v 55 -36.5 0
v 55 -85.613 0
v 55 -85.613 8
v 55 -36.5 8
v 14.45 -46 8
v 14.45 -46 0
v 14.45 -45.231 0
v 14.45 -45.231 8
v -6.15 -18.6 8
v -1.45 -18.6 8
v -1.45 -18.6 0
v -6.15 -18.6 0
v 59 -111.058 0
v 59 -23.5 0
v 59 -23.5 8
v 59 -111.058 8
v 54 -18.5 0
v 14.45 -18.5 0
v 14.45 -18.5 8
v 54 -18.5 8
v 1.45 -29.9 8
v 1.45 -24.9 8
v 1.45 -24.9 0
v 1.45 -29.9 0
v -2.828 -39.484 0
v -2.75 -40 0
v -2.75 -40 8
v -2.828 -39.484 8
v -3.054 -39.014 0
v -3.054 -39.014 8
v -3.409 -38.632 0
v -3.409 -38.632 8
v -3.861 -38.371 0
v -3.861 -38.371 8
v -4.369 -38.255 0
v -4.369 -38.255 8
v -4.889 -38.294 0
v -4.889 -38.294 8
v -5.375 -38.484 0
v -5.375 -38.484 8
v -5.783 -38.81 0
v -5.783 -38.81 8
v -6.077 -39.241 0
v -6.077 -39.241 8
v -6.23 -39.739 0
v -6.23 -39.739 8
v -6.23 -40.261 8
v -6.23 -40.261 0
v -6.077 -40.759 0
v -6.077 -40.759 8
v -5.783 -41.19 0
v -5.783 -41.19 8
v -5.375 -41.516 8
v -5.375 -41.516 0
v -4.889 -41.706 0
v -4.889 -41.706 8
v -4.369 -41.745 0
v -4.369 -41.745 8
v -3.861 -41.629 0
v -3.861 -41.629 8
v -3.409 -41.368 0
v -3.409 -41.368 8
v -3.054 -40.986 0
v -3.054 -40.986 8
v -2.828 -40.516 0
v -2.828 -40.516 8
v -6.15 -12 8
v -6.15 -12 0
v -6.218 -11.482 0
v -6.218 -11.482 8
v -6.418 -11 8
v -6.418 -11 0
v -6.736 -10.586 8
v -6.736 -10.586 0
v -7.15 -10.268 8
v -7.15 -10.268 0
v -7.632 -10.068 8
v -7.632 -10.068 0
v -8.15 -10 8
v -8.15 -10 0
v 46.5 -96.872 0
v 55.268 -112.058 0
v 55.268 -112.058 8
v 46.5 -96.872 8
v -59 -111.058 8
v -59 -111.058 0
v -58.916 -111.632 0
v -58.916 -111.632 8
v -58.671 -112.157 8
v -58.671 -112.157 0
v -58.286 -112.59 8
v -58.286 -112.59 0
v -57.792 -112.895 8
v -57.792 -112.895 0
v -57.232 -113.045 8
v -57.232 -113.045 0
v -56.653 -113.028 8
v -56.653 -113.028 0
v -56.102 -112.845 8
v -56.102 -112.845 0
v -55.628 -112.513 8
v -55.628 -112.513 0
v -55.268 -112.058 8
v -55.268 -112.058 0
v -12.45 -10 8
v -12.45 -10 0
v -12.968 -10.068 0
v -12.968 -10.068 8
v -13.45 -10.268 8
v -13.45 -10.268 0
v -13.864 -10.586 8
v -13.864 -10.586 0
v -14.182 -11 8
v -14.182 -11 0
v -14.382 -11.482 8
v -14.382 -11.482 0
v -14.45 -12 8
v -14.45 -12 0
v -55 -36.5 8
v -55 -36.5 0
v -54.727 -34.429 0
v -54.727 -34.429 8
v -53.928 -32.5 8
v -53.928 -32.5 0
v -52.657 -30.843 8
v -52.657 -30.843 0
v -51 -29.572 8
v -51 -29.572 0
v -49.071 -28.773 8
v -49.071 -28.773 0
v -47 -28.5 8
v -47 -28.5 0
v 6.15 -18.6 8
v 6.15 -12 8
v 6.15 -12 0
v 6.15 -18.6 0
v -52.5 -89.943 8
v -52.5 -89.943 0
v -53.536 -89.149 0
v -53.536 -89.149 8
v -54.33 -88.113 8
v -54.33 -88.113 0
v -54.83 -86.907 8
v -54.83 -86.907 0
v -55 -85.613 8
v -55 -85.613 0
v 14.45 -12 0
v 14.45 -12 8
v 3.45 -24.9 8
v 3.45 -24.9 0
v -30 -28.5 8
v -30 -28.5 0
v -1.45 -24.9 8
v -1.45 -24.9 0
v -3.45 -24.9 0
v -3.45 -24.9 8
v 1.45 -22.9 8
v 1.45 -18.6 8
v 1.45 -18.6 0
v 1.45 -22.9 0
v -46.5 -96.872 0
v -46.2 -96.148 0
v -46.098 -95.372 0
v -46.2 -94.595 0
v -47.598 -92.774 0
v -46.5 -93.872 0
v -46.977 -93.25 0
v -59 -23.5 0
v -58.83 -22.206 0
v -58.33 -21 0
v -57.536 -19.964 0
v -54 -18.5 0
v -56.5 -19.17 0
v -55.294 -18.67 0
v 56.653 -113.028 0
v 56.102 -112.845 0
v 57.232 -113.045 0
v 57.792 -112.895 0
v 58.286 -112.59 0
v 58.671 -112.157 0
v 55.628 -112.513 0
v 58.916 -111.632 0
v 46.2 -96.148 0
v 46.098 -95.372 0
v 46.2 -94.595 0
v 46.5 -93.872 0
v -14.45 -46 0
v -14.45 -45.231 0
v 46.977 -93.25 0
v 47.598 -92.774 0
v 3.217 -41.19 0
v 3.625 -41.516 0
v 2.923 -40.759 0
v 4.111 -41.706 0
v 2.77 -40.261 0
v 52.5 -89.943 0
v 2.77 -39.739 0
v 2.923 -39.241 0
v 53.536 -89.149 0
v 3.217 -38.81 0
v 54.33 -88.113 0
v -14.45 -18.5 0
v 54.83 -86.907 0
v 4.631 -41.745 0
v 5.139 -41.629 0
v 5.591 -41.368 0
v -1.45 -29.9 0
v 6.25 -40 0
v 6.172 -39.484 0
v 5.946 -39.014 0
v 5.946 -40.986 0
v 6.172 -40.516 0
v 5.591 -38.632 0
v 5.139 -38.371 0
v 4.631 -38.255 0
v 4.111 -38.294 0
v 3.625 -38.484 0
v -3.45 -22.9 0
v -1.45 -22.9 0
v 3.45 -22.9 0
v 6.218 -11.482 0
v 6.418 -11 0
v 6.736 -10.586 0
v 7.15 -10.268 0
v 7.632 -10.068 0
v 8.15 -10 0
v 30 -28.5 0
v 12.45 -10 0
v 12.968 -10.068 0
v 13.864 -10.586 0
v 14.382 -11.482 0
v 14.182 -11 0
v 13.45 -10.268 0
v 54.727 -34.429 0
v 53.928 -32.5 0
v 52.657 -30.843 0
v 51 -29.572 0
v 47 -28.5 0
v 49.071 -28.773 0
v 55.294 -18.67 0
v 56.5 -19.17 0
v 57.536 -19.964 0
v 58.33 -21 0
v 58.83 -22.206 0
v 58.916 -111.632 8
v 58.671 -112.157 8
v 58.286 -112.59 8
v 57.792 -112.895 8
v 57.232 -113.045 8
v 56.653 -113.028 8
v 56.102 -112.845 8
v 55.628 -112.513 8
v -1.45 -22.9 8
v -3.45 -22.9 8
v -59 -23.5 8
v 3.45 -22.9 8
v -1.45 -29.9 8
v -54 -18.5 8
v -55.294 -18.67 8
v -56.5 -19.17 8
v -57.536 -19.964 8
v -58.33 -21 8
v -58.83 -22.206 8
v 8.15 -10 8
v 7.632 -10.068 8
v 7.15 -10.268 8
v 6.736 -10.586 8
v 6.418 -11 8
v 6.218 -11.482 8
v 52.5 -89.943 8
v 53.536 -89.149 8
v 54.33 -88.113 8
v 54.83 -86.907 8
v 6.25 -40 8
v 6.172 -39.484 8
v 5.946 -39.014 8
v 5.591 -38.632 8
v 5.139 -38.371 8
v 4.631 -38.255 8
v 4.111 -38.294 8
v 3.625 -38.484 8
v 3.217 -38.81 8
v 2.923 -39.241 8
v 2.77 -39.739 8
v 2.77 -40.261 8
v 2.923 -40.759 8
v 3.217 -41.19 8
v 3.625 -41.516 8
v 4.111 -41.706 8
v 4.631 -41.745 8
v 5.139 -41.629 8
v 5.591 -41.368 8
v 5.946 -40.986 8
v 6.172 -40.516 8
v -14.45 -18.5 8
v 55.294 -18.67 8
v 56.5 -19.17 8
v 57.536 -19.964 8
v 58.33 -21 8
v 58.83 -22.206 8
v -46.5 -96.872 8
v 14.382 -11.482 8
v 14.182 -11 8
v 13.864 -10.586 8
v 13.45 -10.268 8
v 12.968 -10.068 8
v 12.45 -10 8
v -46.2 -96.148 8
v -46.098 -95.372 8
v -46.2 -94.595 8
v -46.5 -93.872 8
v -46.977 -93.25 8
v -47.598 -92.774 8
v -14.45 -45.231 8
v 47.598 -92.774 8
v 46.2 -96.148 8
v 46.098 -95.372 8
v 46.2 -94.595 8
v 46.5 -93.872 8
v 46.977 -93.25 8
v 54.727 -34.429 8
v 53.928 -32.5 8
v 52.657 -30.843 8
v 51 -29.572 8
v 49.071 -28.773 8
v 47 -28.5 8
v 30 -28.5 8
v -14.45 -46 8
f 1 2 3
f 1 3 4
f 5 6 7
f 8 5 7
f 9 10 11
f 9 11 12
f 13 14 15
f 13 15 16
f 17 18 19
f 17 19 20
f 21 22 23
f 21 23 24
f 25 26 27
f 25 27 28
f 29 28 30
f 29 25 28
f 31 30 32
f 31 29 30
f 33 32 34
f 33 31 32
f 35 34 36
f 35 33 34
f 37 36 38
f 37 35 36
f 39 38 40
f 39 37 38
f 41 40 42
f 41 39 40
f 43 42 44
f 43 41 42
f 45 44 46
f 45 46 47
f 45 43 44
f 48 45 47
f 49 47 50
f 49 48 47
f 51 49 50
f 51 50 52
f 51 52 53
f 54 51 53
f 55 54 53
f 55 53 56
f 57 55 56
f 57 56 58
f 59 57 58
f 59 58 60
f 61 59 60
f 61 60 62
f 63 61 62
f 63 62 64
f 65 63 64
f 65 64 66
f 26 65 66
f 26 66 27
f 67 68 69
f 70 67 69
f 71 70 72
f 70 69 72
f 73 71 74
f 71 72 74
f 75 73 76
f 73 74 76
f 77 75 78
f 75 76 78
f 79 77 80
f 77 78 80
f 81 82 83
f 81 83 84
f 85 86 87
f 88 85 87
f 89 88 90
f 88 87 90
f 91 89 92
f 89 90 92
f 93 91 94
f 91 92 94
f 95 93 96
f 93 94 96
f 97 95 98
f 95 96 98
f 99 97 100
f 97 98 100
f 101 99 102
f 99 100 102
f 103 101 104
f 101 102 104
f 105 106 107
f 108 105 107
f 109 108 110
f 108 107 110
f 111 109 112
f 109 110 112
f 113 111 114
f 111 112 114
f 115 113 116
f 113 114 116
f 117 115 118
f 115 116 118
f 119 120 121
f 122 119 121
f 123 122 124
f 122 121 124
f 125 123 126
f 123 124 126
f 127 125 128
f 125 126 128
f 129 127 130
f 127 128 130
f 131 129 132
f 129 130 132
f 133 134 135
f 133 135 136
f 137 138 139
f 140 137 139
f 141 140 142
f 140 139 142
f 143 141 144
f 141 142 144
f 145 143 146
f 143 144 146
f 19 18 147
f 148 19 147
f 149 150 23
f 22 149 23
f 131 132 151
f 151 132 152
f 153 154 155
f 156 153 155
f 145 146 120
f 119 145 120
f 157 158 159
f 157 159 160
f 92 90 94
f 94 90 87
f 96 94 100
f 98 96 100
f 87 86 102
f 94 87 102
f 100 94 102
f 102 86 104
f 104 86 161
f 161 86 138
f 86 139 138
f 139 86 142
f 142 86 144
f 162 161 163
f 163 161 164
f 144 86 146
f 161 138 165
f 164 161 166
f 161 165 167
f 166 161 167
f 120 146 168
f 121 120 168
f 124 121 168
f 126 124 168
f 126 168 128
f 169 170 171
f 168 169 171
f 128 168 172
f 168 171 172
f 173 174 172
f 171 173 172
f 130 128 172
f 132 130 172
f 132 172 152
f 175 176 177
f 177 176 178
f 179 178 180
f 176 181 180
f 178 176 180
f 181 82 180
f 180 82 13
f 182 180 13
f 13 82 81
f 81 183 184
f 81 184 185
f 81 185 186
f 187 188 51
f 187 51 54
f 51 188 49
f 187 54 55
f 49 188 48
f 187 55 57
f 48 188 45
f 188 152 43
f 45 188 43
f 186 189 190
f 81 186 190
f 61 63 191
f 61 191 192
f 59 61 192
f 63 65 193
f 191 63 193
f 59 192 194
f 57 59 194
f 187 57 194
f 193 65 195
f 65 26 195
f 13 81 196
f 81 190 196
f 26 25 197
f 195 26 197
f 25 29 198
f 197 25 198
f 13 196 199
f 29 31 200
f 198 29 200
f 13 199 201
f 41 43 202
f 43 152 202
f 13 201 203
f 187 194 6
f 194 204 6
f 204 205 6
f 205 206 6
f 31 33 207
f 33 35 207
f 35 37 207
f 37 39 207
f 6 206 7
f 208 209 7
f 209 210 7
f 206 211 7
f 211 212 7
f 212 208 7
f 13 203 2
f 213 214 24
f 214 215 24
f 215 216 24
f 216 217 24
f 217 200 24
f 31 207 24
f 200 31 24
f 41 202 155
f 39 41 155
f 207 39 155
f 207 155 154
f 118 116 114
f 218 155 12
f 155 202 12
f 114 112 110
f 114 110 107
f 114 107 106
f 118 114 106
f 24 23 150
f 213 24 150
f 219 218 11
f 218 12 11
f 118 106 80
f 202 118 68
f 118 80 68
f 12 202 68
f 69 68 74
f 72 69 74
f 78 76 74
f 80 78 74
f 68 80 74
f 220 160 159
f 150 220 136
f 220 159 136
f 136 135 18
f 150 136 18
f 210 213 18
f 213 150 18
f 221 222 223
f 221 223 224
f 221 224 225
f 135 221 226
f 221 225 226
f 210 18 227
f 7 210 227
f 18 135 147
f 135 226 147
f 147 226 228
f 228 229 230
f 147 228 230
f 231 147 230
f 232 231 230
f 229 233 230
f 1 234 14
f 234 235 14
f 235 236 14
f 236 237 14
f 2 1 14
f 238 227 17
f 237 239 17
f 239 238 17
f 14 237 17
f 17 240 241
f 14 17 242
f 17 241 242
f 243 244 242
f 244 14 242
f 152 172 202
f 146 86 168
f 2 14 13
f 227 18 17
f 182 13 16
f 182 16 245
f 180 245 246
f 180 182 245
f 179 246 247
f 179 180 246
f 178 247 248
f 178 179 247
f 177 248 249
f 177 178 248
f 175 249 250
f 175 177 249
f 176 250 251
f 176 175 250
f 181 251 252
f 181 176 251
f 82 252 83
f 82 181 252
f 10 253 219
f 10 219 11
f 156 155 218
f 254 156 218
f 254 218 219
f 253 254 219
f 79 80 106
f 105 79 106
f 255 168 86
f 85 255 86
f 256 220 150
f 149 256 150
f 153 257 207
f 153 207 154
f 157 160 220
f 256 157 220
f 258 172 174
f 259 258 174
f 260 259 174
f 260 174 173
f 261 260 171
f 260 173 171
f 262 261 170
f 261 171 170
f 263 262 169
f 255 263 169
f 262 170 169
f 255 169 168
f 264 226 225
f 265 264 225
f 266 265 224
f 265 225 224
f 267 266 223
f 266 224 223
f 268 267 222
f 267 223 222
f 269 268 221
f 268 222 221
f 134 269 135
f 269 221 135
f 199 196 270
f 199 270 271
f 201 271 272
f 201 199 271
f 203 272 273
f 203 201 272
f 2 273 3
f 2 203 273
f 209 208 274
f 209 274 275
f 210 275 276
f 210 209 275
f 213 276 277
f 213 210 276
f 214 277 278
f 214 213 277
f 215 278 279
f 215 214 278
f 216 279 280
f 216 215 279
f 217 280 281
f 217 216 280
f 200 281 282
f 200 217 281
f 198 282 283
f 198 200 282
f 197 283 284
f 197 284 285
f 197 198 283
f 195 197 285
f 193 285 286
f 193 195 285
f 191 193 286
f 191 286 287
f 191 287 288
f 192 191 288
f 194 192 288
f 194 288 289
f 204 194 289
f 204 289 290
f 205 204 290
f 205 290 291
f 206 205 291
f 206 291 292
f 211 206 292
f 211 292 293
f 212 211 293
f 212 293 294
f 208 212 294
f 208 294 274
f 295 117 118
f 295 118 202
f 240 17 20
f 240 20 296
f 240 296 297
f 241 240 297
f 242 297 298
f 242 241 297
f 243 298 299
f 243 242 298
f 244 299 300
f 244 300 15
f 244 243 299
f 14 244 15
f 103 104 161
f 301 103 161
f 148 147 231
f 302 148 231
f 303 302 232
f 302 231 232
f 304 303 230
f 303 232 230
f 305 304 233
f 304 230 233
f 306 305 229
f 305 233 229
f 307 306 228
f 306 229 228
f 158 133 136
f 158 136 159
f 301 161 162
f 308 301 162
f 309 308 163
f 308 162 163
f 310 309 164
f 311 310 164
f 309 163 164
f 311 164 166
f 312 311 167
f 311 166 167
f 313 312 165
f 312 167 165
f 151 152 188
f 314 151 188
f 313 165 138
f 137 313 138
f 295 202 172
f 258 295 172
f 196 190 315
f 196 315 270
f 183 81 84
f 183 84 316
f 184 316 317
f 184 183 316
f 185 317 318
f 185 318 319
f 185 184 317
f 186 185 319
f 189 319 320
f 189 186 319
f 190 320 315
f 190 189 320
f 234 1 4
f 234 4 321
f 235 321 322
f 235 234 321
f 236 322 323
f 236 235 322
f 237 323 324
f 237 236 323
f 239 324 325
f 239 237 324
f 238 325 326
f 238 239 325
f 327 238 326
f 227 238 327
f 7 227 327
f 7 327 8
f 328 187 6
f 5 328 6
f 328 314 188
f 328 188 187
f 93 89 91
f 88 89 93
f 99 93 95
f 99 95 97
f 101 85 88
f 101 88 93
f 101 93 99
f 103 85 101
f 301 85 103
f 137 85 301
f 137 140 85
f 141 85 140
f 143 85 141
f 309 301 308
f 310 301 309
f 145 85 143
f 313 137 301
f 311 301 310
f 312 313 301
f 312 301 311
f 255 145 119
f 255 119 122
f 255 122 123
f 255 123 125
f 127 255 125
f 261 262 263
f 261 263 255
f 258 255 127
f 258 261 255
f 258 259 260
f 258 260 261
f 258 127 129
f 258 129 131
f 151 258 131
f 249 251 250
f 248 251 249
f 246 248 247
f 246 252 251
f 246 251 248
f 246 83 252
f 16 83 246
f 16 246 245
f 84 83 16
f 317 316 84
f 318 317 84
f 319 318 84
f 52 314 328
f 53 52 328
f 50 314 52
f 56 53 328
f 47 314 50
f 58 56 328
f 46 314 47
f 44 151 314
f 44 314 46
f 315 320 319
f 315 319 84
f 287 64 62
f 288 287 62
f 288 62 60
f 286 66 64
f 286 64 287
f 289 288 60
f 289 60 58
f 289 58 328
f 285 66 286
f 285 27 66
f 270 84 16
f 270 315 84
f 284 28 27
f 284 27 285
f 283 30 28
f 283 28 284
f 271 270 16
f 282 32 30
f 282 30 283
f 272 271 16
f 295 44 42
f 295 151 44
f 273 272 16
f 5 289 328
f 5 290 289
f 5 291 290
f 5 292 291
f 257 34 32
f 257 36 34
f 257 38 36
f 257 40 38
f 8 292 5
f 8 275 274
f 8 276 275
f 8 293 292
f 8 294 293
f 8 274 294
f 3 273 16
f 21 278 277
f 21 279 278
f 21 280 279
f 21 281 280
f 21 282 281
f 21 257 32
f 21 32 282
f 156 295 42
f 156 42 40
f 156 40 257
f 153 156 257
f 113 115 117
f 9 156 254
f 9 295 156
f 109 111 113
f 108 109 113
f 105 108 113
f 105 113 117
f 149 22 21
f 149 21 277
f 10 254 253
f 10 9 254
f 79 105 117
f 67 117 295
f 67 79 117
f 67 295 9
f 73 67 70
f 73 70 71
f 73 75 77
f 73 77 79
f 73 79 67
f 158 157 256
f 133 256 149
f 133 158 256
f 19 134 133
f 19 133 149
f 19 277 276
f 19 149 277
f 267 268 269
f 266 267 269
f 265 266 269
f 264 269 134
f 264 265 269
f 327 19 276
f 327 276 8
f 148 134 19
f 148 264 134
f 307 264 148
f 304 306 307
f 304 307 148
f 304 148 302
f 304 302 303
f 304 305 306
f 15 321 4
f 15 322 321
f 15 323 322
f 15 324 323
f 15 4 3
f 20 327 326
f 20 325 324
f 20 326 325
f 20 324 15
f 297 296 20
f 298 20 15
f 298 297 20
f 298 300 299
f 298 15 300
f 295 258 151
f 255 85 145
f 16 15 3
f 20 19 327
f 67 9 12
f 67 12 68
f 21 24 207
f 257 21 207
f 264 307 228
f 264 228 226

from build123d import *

# Parameters (mm, degrees)
F0_R     = 1.75
F1_DEPTH = 8
F3_DEPTH = 8


with BuildPart() as f1:
    # F0 (on Top) → F1 (new body)
    with BuildSketch(Plane.XY):
        with BuildLine():
            Line((-8.15, -10), (-12.45, -10))
            ThreePointArc((-12.45, -10), (-13.8642135624, -10.5857864376), (-14.45, -12))
            Line((-14.45, -12), (-14.45, -46))
            Line((-14.45, -46), (14.45, -46))
            Line((14.45, -46), (14.45, -12))
            ThreePointArc((14.45, -12), (13.8642135624, -10.5857864376), (12.45, -10))
            Line((12.45, -10), (8.15, -10))
            ThreePointArc((8.15, -10), (6.7357864376, -10.5857864376), (6.15, -12))
            Line((6.15, -12), (6.15, -18.6))
            Line((6.15, -18.6), (1.45, -18.6))
            Line((1.45, -18.6), (1.45, -22.9))
            Line((1.45, -22.9), (3.45, -22.9))
            Line((3.45, -22.9), (3.45, -24.9))
            Line((3.45, -24.9), (1.45, -24.9))
            Line((1.45, -24.9), (1.45, -29.9))
            Line((1.45, -29.9), (-1.45, -29.9))
            Line((-1.45, -29.9), (-1.45, -24.9))
            Line((-1.45, -24.9), (-3.45, -24.9))
            Line((-3.45, -24.9), (-3.45, -22.9))
            Line((-3.45, -22.9), (-1.45, -22.9))
            Line((-1.45, -22.9), (-1.45, -18.6))
            Line((-1.45, -18.6), (-6.15, -18.6))
            Line((-6.15, -18.6), (-6.15, -12))
            ThreePointArc((-6.15, -12), (-6.7357864376, -10.5857864376), (-8.15, -10))
        make_face()
        with Locations((-4.5, -40)):
            Circle(F0_R, mode=Mode.SUBTRACT)
        with Locations((4.5, -40)):
            Circle(F0_R, mode=Mode.SUBTRACT)
    extrude(amount=F1_DEPTH)

    # F2 (on Top) → F3 (join)
    with BuildSketch(Plane.XY):
        with BuildLine():
            Line((-14.2, -45.5), (-10.8380588046, -18.5))
            Line((-10.8380588046, -18.5), (-54, -18.5))
            ThreePointArc((-54, -18.5), (-57.5355339059, -19.9644660941), (-59, -23.5))
            Line((-59, -23.5), (-59, -111.0581123827))
            ThreePointArc((-59, -111.0581123827), (-57.5176380902, -112.9899640353), (-55.2679491924, -112.0581123827))
            Line((-55.2679491924, -112.0581123827), (-46.5, -96.8715789032))
            ThreePointArc((-46.5, -96.8715789032), (-46.2002987325, -94.5951217679), (-47.5980762114, -92.7735026919))
            Line((-47.5980762114, -92.7735026919), (-52.5, -89.943375673))
            ThreePointArc((-52.5, -89.943375673), (-54.3301270189, -88.1132486541), (-55, -85.6132486541))
            Line((-55, -85.6132486541), (-55, -36.5))
            ThreePointArc((-55, -36.5), (-52.6568542495, -30.8431457505), (-47, -28.5))
            Line((-47, -28.5), (-30, -28.5))
            Line((-30, -28.5), (-14.2, -45.5))
        make_face()
    extrude(amount=F3_DEPTH)

    # F4: F1 across plane


with BuildPart() as f1_1:
    add(f1.part)
    add(f1.part.mirror(Plane.YZ))


solid = f1_1.part
